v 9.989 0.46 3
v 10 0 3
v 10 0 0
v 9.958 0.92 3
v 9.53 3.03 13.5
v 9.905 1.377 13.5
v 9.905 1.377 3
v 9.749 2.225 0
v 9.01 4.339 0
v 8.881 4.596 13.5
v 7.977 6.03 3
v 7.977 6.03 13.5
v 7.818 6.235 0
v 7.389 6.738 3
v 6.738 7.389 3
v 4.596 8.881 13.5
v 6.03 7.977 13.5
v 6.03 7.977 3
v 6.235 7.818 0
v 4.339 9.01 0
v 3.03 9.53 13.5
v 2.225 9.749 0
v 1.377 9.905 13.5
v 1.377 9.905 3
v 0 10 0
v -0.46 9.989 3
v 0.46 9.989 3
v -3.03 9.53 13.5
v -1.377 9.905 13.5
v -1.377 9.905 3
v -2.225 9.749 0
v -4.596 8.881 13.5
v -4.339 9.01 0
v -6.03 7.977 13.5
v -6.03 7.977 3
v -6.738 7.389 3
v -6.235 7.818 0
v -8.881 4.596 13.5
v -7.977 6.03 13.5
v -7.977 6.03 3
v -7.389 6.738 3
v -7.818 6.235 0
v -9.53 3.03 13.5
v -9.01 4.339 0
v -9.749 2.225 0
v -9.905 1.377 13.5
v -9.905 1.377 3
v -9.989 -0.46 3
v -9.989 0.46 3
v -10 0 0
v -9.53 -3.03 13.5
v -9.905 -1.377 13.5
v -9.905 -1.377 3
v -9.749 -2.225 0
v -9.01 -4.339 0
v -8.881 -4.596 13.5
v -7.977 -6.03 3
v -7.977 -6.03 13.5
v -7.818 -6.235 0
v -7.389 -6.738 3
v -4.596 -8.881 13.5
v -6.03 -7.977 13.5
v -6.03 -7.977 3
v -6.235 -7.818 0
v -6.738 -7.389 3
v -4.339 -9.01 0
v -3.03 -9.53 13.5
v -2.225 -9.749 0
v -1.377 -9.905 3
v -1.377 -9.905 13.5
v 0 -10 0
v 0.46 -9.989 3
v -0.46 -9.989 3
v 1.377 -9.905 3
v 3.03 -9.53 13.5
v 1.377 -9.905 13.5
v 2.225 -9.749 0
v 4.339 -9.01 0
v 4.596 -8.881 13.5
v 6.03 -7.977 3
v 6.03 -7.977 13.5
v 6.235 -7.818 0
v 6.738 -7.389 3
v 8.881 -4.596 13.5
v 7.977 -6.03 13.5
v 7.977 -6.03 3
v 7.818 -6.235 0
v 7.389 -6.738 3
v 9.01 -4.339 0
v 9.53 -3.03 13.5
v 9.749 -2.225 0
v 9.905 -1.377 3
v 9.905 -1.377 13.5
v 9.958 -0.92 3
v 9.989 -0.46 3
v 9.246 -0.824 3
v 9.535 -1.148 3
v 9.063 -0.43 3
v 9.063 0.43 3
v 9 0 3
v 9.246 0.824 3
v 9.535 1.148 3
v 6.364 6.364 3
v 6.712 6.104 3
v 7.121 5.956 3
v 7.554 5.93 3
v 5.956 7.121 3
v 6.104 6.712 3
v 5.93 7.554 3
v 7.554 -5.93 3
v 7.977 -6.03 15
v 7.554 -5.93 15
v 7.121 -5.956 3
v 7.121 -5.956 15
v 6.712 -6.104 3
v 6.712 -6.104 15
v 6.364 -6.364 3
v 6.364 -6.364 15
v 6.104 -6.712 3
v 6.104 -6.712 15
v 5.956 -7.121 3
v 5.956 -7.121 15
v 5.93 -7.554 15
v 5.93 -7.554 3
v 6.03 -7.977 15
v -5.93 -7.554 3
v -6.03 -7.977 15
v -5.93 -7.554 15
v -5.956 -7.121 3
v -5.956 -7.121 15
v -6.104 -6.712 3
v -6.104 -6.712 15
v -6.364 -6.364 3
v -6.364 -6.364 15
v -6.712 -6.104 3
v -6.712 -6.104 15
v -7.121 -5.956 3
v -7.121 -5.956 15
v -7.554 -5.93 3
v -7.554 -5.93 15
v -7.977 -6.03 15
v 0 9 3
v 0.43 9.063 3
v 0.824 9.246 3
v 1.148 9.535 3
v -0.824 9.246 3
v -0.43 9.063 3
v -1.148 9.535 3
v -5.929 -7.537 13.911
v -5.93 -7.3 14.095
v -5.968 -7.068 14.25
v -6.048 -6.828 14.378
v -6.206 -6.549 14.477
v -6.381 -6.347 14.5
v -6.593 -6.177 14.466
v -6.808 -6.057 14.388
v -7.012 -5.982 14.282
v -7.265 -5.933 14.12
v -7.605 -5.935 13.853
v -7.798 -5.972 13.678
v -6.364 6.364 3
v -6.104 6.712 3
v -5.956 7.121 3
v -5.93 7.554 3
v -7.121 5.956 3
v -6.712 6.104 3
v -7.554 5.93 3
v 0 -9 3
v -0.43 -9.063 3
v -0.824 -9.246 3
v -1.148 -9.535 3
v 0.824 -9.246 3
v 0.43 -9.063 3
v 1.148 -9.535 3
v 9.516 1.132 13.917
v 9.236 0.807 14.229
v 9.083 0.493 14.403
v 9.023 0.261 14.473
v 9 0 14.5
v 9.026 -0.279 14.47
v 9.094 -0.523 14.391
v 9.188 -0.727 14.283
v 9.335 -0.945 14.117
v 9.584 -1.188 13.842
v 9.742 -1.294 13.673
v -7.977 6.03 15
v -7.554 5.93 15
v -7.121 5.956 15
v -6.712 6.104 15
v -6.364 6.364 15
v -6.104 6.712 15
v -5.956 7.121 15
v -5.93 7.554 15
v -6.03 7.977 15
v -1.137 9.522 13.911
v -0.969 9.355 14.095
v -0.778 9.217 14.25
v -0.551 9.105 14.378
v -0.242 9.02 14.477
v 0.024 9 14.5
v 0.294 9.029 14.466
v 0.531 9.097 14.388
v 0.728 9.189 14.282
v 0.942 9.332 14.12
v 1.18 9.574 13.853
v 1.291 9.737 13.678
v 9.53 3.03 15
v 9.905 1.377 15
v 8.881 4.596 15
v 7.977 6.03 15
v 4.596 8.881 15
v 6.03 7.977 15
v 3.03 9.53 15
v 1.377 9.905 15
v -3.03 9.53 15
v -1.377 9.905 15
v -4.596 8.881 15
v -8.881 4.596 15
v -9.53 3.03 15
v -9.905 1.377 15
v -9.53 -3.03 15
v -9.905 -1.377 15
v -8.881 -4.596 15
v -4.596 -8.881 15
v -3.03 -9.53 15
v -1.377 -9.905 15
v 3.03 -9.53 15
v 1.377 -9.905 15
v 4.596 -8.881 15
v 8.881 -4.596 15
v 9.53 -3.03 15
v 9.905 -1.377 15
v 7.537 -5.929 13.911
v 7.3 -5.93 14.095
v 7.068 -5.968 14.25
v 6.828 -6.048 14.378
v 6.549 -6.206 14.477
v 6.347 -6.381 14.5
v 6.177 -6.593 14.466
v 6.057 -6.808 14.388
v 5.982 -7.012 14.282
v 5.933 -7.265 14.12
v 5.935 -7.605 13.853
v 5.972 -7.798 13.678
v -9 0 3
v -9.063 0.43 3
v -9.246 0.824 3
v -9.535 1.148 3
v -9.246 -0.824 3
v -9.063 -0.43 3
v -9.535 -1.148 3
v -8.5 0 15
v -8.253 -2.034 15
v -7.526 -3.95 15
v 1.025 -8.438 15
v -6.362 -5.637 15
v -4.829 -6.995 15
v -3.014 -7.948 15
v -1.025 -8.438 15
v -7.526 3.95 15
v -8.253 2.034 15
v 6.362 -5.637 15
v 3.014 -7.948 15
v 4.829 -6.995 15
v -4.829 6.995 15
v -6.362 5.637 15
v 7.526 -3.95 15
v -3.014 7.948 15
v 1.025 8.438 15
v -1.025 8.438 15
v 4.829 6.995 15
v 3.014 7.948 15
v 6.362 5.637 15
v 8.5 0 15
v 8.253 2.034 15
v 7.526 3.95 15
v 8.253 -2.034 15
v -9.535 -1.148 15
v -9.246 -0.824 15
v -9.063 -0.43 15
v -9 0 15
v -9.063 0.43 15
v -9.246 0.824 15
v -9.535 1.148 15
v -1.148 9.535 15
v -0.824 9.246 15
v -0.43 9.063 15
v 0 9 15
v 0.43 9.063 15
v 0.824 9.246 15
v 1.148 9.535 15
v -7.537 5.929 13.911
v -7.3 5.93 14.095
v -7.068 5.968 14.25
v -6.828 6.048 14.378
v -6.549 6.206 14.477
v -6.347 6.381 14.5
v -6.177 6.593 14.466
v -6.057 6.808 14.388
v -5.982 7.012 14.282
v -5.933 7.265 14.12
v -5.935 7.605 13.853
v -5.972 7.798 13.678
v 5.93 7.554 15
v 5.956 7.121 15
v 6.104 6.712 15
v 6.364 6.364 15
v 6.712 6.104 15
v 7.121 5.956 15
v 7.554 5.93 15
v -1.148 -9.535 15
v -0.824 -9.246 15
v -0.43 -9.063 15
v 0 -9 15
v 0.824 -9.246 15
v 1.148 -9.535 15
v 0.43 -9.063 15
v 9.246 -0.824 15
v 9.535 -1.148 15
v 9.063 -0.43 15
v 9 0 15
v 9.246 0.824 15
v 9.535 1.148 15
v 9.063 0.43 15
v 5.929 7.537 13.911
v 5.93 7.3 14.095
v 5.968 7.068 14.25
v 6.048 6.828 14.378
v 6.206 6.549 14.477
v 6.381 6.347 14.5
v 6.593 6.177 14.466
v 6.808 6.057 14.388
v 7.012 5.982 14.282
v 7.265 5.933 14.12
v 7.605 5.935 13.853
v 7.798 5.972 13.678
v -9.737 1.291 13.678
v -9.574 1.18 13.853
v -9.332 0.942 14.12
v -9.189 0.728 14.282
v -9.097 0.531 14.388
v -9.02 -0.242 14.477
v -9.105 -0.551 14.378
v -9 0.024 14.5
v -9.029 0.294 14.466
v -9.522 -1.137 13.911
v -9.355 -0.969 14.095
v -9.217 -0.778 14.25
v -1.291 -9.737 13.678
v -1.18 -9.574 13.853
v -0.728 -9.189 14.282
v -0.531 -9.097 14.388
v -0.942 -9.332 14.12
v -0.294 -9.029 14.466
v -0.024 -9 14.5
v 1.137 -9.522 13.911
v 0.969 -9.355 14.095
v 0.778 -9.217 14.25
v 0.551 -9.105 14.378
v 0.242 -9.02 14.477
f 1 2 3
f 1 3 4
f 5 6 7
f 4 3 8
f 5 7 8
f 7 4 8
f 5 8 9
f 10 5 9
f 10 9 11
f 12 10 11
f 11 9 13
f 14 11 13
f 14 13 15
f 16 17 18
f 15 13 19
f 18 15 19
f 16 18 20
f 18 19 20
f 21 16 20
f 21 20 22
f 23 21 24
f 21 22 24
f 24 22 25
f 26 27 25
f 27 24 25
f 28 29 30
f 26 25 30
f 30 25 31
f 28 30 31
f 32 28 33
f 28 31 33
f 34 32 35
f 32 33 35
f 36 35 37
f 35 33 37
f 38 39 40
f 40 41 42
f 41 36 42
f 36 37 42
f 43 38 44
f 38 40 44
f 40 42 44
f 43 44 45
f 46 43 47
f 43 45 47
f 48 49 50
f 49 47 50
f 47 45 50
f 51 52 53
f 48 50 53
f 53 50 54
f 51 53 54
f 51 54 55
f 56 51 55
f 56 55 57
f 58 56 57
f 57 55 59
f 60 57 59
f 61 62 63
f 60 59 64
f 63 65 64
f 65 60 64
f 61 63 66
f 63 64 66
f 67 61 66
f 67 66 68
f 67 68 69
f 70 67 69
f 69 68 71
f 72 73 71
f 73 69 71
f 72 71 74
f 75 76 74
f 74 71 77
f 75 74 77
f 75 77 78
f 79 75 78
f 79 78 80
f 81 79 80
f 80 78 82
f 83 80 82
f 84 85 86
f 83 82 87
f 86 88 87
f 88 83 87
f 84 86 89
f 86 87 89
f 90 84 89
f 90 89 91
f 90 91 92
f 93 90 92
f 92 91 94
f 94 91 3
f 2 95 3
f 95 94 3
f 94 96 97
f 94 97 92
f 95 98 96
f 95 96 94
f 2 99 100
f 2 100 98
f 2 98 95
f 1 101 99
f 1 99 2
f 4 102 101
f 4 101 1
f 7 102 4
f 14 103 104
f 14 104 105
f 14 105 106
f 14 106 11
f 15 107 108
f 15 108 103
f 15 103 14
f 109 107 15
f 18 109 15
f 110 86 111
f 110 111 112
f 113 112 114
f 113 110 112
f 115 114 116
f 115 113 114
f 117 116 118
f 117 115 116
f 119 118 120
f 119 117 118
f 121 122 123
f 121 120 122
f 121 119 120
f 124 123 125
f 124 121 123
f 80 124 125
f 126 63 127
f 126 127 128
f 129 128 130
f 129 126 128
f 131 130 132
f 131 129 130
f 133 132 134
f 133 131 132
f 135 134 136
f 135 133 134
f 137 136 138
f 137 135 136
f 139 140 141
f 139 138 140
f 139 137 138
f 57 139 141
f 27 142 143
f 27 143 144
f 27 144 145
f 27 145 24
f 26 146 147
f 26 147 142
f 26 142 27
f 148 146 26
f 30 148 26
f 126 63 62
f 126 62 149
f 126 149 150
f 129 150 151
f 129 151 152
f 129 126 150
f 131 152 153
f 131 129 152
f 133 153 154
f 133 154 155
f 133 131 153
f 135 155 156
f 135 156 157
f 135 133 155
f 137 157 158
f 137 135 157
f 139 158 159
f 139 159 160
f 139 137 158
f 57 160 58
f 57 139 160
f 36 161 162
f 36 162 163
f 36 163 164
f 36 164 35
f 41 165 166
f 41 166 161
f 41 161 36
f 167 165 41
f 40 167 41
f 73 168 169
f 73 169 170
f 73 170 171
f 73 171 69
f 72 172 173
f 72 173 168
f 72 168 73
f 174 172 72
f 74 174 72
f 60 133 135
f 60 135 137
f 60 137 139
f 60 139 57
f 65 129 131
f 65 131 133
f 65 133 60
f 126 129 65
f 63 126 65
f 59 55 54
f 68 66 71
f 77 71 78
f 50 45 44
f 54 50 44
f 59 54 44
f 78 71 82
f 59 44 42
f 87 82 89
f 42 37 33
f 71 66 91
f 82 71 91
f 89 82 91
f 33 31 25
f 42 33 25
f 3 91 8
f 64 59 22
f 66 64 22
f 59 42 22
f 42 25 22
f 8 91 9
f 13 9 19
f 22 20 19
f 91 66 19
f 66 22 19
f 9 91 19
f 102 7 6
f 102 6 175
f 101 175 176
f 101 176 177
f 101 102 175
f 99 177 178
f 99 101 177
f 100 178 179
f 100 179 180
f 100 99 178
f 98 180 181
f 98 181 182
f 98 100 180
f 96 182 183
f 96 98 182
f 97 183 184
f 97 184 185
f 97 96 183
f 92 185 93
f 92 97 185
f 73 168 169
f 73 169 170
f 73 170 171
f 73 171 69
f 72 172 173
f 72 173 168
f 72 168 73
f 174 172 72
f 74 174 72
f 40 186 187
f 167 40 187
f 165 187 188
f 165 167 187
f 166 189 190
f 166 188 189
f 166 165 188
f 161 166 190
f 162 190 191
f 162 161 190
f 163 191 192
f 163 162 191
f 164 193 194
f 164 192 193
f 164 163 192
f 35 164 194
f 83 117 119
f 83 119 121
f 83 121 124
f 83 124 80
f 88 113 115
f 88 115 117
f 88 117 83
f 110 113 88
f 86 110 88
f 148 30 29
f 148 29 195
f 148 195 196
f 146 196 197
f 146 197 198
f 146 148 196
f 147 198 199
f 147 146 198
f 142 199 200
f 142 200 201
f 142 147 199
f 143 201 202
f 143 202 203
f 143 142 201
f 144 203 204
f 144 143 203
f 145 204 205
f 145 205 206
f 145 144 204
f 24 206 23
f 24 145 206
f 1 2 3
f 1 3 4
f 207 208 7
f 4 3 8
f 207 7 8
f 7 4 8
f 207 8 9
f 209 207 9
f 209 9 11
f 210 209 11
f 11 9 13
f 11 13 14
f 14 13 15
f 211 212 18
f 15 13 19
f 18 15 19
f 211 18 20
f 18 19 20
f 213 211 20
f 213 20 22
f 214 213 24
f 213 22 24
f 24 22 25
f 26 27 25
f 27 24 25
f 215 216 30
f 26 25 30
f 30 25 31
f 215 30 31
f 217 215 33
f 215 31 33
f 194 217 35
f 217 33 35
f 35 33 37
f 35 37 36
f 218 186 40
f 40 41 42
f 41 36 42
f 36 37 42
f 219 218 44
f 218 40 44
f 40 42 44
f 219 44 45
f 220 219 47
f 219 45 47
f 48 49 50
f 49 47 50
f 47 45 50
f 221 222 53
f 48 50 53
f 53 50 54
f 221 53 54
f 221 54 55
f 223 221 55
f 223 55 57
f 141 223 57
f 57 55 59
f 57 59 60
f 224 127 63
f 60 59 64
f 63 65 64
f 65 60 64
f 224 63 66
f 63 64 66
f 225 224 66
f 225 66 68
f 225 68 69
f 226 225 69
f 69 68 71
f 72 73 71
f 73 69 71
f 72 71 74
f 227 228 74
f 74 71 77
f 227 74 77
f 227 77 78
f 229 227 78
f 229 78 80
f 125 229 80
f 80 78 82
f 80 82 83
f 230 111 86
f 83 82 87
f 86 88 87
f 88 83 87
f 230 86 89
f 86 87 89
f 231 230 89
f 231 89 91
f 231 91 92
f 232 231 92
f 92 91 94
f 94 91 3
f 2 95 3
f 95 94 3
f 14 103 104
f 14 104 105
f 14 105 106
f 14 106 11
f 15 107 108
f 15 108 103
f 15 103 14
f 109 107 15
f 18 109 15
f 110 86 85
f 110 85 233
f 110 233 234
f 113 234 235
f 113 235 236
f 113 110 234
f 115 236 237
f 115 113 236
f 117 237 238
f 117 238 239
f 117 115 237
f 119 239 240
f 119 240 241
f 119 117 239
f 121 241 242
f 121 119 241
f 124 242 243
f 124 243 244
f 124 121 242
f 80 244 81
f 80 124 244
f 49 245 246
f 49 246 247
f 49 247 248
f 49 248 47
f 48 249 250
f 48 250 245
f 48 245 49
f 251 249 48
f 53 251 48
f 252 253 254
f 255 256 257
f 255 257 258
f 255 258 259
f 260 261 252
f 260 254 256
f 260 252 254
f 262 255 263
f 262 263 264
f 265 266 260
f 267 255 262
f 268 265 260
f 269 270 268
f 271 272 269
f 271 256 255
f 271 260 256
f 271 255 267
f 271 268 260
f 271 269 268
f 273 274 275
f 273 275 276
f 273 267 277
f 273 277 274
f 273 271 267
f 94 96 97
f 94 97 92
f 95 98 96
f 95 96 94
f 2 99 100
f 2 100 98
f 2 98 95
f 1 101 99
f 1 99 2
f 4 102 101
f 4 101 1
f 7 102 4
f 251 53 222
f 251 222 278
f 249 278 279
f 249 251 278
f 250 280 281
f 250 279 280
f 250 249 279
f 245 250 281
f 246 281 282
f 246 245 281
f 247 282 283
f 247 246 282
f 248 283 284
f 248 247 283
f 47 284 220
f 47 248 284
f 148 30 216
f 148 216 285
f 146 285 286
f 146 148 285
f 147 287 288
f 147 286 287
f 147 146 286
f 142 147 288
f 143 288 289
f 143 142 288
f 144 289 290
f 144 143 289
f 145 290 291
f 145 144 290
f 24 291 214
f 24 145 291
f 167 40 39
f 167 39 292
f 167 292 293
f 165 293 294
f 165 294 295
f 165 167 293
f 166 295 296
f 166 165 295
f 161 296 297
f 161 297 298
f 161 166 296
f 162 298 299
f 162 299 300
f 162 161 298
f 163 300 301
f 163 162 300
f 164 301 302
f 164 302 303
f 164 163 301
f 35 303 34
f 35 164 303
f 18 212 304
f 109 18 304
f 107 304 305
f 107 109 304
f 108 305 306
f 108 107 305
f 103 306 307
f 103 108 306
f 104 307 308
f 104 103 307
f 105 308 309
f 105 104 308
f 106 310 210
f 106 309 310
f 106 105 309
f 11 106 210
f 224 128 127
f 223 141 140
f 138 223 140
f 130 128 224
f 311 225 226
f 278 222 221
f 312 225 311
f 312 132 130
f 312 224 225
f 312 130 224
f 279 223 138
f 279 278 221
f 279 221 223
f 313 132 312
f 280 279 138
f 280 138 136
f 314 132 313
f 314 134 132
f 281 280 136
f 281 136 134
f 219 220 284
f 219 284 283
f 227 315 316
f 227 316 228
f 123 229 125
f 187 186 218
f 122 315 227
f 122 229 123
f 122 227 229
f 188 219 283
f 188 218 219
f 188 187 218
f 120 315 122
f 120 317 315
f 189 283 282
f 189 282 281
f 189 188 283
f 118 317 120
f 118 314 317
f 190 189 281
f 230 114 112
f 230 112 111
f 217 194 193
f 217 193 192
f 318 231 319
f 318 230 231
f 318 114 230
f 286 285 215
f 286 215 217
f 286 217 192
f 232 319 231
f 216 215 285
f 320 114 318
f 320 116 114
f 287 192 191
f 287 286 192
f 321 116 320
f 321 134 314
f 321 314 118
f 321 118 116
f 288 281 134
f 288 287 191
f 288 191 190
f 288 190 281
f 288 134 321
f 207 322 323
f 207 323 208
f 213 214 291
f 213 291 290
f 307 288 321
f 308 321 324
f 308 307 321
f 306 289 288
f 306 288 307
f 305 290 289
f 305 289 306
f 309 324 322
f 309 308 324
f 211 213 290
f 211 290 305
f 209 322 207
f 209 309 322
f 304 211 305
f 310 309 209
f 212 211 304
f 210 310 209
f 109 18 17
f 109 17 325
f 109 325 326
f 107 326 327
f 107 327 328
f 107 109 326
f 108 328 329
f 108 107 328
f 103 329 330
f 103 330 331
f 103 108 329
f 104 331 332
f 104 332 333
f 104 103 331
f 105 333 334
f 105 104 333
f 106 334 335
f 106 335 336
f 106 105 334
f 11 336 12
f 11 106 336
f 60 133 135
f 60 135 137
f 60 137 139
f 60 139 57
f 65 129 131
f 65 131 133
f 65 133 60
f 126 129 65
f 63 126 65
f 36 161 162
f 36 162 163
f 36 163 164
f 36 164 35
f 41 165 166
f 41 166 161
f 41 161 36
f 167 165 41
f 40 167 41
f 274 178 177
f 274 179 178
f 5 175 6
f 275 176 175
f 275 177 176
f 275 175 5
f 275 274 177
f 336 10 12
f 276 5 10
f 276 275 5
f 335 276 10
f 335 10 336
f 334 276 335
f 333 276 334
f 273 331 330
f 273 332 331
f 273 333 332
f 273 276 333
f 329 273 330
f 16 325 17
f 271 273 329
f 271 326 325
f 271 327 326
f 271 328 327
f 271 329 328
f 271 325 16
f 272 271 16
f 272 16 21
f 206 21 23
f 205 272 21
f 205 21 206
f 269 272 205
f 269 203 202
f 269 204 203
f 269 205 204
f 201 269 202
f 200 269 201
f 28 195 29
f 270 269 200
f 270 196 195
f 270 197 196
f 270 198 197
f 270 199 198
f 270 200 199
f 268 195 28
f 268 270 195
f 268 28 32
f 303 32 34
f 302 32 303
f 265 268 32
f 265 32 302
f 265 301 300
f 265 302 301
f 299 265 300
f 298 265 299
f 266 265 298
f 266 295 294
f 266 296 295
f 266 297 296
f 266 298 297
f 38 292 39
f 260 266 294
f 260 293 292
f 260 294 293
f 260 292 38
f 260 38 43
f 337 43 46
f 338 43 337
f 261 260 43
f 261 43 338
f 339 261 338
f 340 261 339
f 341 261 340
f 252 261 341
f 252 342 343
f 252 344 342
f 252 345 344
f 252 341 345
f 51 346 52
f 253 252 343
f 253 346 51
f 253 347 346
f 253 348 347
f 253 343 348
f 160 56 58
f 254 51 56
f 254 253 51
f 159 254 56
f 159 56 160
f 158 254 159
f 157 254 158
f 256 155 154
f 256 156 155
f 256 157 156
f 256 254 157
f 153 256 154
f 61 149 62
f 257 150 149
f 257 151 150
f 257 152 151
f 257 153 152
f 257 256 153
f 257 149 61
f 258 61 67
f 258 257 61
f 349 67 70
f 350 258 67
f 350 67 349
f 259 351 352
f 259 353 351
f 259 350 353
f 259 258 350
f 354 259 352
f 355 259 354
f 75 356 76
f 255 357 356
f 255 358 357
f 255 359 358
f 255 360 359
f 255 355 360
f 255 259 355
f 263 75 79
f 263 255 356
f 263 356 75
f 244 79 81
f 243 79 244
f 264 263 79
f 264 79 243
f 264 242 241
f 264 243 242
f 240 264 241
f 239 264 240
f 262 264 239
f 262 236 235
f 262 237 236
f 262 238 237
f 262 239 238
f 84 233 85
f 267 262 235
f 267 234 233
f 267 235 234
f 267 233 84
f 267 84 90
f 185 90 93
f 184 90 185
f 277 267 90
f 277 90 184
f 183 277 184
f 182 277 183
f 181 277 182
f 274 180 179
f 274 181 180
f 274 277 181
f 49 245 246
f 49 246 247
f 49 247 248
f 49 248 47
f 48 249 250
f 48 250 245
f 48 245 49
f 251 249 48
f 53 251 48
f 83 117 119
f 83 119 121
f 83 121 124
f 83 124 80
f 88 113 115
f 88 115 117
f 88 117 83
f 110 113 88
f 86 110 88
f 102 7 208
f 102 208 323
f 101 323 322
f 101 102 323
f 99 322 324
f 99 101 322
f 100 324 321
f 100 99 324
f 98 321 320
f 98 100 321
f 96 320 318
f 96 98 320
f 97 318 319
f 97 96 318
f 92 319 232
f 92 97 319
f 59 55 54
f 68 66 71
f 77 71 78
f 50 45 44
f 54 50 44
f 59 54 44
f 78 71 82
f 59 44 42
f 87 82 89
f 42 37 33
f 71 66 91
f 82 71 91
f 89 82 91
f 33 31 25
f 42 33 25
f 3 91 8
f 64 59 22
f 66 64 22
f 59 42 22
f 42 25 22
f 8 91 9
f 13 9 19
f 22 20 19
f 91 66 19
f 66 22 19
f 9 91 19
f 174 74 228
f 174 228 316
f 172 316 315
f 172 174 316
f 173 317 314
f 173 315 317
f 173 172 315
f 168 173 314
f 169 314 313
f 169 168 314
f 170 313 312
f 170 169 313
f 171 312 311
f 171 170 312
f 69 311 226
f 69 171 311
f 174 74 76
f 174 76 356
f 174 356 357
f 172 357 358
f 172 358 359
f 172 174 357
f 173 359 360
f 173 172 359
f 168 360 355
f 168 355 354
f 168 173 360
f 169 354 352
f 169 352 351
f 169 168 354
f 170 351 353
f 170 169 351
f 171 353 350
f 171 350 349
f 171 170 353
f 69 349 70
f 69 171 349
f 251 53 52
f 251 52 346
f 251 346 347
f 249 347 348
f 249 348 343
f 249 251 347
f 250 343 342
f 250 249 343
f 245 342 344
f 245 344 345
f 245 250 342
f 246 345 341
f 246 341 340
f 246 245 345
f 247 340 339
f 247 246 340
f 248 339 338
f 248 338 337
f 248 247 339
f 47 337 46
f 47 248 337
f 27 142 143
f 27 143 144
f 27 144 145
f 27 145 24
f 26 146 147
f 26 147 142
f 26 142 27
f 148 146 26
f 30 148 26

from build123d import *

# Parameters (mm, degrees)
CYLINDER001_R     = 1.5
CYLINDER001_DEPTH = 19
ARRAY_COUNT       = 8
CYLINDER_R        = 10
CYLINDER_DEPTH    = 15
CYLINDER002_R     = 1.5
CYLINDER002_DEPTH = 19
ARRAY001_COUNT    = 8
CYLINDER003_R     = 10
CYLINDER003_DEPTH = 15
CHAMFER_SIZE      = 1.5


with BuildPart() as muescas:
    # Cylinder001 → Cylinder001 (new body)
    with BuildSketch(Plane(origin=(10.5, 0, 3), x_dir=(1, 0, 0), z_dir=(0, 0, 1))):
        Circle(CYLINDER001_R)
    extrude(amount=CYLINDER001_DEPTH)

    # Array: muescas ×8 about axis
    array_axis = Axis((0, 0, 0), (0, 0, 1))


with BuildPart() as muescas_1:
    add(muescas.part)
    for i in range(1, ARRAY_COUNT):
        add(muescas.part.rotate(array_axis, i * 360 / ARRAY_COUNT))


with BuildPart() as selector:
    # Cylinder → Cylinder (new body)
    with BuildSketch(Plane.XY):
        Circle(CYLINDER_R)
    extrude(amount=CYLINDER_DEPTH)

    # Cut: cut muescas
    add(muescas_1.part, mode=Mode.SUBTRACT)


with BuildPart() as muescas001:
    # Cylinder002 → Cylinder002 (new body)
    with BuildSketch(Plane(origin=(10.5, 0, 3), x_dir=(1, 0, 0), z_dir=(0, 0, 1))):
        Circle(CYLINDER002_R)
    extrude(amount=CYLINDER002_DEPTH)

    # Array001: muescas001 ×8 about axis
    array001_axis = Axis((0, 0, 0), (0, 0, 1))


with BuildPart() as muescas001_1:
    add(muescas001.part)
    for i in range(1, ARRAY001_COUNT):
        add(muescas001.part.rotate(array001_axis, i * 360 / ARRAY001_COUNT))


with BuildPart() as selector_nuevo:
    # Cylinder003 → Cylinder003 (new body)
    with BuildSketch(Plane.XY):
        Circle(CYLINDER003_R)
    extrude(amount=CYLINDER003_DEPTH)

    # Chamfer
    chamfer_edges = [selector_nuevo.edges().sort_by_distance(p)[0] for p in [
        (-10, 0, 15),
    ]]
    chamfer(chamfer_edges, length=CHAMFER_SIZE)

    # Cut001: cut muescas001
    add(muescas001_1.part, mode=Mode.SUBTRACT)


solid = Compound([selector.part, selector_nuevo.part])
